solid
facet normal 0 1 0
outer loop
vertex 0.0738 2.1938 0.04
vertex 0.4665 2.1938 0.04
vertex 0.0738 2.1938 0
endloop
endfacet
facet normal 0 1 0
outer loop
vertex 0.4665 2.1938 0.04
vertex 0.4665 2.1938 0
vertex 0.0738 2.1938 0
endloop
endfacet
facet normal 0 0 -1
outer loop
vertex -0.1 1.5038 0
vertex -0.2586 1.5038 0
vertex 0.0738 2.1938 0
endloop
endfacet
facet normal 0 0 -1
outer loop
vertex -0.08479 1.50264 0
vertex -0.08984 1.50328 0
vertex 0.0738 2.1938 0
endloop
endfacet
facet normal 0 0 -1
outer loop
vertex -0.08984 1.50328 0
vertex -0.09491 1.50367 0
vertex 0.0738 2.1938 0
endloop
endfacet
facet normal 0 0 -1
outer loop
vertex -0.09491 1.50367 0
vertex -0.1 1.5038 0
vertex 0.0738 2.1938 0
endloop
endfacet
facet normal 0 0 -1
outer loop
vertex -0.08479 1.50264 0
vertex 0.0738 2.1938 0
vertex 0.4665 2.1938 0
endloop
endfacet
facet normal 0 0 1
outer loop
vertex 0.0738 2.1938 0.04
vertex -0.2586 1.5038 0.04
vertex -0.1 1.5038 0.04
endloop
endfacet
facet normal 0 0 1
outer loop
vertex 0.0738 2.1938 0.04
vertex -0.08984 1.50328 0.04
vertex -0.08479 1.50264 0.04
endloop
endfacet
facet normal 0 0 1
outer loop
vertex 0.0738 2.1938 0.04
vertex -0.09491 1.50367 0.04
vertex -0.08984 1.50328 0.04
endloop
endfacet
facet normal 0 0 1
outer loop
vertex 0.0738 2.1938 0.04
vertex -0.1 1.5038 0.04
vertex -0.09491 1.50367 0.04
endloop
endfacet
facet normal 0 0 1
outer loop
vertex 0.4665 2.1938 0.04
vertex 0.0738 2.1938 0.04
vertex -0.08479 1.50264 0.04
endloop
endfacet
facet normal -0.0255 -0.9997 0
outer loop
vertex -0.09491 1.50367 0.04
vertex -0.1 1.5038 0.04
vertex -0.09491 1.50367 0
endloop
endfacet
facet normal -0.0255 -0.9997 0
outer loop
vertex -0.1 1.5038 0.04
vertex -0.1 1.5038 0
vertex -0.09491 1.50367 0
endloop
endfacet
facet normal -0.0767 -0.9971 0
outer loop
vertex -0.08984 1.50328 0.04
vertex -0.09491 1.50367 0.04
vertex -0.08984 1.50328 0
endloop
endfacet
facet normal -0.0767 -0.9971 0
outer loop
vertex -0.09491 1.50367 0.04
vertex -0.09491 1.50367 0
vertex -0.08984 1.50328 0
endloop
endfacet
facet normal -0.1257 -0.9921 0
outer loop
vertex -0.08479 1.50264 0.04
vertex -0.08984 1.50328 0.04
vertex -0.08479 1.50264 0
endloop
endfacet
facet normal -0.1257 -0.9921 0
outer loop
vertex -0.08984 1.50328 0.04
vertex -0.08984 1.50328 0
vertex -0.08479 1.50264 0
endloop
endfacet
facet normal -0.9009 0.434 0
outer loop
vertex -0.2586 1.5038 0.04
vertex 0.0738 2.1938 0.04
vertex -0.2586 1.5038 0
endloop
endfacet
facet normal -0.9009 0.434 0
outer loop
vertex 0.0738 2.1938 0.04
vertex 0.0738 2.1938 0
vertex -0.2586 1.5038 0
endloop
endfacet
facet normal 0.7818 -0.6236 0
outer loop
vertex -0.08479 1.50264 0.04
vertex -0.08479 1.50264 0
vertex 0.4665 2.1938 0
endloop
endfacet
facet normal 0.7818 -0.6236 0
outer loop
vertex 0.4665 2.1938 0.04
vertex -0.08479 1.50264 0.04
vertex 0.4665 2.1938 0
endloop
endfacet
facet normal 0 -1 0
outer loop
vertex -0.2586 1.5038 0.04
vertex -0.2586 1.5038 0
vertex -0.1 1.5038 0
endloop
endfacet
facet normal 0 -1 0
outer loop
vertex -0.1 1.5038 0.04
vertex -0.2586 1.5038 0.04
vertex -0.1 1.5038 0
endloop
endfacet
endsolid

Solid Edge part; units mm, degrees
sketch "Sketch1" plane through (0, 0, 0) normal (0, 0, 1) x (1, 0, 0)
  line L0 (-0.0848, 1.5026) -> (0.4665, 2.1938)
  line L1 (0.4665, 2.1938) -> (0.0738, 2.1938)
  line L2 (0.0738, 2.1938) -> (-0.2586, 1.5038)
  line L3 (-0.2586, 1.5038) -> (-0.1, 1.5038)
  arc A0 (-0.0848, 1.5026) -> (-0.1, 1.5038) centre (-0.1, 1.4038) ccw
extrude "Protrusion1" add sketch "Sketch1" along normal blind 0.04
